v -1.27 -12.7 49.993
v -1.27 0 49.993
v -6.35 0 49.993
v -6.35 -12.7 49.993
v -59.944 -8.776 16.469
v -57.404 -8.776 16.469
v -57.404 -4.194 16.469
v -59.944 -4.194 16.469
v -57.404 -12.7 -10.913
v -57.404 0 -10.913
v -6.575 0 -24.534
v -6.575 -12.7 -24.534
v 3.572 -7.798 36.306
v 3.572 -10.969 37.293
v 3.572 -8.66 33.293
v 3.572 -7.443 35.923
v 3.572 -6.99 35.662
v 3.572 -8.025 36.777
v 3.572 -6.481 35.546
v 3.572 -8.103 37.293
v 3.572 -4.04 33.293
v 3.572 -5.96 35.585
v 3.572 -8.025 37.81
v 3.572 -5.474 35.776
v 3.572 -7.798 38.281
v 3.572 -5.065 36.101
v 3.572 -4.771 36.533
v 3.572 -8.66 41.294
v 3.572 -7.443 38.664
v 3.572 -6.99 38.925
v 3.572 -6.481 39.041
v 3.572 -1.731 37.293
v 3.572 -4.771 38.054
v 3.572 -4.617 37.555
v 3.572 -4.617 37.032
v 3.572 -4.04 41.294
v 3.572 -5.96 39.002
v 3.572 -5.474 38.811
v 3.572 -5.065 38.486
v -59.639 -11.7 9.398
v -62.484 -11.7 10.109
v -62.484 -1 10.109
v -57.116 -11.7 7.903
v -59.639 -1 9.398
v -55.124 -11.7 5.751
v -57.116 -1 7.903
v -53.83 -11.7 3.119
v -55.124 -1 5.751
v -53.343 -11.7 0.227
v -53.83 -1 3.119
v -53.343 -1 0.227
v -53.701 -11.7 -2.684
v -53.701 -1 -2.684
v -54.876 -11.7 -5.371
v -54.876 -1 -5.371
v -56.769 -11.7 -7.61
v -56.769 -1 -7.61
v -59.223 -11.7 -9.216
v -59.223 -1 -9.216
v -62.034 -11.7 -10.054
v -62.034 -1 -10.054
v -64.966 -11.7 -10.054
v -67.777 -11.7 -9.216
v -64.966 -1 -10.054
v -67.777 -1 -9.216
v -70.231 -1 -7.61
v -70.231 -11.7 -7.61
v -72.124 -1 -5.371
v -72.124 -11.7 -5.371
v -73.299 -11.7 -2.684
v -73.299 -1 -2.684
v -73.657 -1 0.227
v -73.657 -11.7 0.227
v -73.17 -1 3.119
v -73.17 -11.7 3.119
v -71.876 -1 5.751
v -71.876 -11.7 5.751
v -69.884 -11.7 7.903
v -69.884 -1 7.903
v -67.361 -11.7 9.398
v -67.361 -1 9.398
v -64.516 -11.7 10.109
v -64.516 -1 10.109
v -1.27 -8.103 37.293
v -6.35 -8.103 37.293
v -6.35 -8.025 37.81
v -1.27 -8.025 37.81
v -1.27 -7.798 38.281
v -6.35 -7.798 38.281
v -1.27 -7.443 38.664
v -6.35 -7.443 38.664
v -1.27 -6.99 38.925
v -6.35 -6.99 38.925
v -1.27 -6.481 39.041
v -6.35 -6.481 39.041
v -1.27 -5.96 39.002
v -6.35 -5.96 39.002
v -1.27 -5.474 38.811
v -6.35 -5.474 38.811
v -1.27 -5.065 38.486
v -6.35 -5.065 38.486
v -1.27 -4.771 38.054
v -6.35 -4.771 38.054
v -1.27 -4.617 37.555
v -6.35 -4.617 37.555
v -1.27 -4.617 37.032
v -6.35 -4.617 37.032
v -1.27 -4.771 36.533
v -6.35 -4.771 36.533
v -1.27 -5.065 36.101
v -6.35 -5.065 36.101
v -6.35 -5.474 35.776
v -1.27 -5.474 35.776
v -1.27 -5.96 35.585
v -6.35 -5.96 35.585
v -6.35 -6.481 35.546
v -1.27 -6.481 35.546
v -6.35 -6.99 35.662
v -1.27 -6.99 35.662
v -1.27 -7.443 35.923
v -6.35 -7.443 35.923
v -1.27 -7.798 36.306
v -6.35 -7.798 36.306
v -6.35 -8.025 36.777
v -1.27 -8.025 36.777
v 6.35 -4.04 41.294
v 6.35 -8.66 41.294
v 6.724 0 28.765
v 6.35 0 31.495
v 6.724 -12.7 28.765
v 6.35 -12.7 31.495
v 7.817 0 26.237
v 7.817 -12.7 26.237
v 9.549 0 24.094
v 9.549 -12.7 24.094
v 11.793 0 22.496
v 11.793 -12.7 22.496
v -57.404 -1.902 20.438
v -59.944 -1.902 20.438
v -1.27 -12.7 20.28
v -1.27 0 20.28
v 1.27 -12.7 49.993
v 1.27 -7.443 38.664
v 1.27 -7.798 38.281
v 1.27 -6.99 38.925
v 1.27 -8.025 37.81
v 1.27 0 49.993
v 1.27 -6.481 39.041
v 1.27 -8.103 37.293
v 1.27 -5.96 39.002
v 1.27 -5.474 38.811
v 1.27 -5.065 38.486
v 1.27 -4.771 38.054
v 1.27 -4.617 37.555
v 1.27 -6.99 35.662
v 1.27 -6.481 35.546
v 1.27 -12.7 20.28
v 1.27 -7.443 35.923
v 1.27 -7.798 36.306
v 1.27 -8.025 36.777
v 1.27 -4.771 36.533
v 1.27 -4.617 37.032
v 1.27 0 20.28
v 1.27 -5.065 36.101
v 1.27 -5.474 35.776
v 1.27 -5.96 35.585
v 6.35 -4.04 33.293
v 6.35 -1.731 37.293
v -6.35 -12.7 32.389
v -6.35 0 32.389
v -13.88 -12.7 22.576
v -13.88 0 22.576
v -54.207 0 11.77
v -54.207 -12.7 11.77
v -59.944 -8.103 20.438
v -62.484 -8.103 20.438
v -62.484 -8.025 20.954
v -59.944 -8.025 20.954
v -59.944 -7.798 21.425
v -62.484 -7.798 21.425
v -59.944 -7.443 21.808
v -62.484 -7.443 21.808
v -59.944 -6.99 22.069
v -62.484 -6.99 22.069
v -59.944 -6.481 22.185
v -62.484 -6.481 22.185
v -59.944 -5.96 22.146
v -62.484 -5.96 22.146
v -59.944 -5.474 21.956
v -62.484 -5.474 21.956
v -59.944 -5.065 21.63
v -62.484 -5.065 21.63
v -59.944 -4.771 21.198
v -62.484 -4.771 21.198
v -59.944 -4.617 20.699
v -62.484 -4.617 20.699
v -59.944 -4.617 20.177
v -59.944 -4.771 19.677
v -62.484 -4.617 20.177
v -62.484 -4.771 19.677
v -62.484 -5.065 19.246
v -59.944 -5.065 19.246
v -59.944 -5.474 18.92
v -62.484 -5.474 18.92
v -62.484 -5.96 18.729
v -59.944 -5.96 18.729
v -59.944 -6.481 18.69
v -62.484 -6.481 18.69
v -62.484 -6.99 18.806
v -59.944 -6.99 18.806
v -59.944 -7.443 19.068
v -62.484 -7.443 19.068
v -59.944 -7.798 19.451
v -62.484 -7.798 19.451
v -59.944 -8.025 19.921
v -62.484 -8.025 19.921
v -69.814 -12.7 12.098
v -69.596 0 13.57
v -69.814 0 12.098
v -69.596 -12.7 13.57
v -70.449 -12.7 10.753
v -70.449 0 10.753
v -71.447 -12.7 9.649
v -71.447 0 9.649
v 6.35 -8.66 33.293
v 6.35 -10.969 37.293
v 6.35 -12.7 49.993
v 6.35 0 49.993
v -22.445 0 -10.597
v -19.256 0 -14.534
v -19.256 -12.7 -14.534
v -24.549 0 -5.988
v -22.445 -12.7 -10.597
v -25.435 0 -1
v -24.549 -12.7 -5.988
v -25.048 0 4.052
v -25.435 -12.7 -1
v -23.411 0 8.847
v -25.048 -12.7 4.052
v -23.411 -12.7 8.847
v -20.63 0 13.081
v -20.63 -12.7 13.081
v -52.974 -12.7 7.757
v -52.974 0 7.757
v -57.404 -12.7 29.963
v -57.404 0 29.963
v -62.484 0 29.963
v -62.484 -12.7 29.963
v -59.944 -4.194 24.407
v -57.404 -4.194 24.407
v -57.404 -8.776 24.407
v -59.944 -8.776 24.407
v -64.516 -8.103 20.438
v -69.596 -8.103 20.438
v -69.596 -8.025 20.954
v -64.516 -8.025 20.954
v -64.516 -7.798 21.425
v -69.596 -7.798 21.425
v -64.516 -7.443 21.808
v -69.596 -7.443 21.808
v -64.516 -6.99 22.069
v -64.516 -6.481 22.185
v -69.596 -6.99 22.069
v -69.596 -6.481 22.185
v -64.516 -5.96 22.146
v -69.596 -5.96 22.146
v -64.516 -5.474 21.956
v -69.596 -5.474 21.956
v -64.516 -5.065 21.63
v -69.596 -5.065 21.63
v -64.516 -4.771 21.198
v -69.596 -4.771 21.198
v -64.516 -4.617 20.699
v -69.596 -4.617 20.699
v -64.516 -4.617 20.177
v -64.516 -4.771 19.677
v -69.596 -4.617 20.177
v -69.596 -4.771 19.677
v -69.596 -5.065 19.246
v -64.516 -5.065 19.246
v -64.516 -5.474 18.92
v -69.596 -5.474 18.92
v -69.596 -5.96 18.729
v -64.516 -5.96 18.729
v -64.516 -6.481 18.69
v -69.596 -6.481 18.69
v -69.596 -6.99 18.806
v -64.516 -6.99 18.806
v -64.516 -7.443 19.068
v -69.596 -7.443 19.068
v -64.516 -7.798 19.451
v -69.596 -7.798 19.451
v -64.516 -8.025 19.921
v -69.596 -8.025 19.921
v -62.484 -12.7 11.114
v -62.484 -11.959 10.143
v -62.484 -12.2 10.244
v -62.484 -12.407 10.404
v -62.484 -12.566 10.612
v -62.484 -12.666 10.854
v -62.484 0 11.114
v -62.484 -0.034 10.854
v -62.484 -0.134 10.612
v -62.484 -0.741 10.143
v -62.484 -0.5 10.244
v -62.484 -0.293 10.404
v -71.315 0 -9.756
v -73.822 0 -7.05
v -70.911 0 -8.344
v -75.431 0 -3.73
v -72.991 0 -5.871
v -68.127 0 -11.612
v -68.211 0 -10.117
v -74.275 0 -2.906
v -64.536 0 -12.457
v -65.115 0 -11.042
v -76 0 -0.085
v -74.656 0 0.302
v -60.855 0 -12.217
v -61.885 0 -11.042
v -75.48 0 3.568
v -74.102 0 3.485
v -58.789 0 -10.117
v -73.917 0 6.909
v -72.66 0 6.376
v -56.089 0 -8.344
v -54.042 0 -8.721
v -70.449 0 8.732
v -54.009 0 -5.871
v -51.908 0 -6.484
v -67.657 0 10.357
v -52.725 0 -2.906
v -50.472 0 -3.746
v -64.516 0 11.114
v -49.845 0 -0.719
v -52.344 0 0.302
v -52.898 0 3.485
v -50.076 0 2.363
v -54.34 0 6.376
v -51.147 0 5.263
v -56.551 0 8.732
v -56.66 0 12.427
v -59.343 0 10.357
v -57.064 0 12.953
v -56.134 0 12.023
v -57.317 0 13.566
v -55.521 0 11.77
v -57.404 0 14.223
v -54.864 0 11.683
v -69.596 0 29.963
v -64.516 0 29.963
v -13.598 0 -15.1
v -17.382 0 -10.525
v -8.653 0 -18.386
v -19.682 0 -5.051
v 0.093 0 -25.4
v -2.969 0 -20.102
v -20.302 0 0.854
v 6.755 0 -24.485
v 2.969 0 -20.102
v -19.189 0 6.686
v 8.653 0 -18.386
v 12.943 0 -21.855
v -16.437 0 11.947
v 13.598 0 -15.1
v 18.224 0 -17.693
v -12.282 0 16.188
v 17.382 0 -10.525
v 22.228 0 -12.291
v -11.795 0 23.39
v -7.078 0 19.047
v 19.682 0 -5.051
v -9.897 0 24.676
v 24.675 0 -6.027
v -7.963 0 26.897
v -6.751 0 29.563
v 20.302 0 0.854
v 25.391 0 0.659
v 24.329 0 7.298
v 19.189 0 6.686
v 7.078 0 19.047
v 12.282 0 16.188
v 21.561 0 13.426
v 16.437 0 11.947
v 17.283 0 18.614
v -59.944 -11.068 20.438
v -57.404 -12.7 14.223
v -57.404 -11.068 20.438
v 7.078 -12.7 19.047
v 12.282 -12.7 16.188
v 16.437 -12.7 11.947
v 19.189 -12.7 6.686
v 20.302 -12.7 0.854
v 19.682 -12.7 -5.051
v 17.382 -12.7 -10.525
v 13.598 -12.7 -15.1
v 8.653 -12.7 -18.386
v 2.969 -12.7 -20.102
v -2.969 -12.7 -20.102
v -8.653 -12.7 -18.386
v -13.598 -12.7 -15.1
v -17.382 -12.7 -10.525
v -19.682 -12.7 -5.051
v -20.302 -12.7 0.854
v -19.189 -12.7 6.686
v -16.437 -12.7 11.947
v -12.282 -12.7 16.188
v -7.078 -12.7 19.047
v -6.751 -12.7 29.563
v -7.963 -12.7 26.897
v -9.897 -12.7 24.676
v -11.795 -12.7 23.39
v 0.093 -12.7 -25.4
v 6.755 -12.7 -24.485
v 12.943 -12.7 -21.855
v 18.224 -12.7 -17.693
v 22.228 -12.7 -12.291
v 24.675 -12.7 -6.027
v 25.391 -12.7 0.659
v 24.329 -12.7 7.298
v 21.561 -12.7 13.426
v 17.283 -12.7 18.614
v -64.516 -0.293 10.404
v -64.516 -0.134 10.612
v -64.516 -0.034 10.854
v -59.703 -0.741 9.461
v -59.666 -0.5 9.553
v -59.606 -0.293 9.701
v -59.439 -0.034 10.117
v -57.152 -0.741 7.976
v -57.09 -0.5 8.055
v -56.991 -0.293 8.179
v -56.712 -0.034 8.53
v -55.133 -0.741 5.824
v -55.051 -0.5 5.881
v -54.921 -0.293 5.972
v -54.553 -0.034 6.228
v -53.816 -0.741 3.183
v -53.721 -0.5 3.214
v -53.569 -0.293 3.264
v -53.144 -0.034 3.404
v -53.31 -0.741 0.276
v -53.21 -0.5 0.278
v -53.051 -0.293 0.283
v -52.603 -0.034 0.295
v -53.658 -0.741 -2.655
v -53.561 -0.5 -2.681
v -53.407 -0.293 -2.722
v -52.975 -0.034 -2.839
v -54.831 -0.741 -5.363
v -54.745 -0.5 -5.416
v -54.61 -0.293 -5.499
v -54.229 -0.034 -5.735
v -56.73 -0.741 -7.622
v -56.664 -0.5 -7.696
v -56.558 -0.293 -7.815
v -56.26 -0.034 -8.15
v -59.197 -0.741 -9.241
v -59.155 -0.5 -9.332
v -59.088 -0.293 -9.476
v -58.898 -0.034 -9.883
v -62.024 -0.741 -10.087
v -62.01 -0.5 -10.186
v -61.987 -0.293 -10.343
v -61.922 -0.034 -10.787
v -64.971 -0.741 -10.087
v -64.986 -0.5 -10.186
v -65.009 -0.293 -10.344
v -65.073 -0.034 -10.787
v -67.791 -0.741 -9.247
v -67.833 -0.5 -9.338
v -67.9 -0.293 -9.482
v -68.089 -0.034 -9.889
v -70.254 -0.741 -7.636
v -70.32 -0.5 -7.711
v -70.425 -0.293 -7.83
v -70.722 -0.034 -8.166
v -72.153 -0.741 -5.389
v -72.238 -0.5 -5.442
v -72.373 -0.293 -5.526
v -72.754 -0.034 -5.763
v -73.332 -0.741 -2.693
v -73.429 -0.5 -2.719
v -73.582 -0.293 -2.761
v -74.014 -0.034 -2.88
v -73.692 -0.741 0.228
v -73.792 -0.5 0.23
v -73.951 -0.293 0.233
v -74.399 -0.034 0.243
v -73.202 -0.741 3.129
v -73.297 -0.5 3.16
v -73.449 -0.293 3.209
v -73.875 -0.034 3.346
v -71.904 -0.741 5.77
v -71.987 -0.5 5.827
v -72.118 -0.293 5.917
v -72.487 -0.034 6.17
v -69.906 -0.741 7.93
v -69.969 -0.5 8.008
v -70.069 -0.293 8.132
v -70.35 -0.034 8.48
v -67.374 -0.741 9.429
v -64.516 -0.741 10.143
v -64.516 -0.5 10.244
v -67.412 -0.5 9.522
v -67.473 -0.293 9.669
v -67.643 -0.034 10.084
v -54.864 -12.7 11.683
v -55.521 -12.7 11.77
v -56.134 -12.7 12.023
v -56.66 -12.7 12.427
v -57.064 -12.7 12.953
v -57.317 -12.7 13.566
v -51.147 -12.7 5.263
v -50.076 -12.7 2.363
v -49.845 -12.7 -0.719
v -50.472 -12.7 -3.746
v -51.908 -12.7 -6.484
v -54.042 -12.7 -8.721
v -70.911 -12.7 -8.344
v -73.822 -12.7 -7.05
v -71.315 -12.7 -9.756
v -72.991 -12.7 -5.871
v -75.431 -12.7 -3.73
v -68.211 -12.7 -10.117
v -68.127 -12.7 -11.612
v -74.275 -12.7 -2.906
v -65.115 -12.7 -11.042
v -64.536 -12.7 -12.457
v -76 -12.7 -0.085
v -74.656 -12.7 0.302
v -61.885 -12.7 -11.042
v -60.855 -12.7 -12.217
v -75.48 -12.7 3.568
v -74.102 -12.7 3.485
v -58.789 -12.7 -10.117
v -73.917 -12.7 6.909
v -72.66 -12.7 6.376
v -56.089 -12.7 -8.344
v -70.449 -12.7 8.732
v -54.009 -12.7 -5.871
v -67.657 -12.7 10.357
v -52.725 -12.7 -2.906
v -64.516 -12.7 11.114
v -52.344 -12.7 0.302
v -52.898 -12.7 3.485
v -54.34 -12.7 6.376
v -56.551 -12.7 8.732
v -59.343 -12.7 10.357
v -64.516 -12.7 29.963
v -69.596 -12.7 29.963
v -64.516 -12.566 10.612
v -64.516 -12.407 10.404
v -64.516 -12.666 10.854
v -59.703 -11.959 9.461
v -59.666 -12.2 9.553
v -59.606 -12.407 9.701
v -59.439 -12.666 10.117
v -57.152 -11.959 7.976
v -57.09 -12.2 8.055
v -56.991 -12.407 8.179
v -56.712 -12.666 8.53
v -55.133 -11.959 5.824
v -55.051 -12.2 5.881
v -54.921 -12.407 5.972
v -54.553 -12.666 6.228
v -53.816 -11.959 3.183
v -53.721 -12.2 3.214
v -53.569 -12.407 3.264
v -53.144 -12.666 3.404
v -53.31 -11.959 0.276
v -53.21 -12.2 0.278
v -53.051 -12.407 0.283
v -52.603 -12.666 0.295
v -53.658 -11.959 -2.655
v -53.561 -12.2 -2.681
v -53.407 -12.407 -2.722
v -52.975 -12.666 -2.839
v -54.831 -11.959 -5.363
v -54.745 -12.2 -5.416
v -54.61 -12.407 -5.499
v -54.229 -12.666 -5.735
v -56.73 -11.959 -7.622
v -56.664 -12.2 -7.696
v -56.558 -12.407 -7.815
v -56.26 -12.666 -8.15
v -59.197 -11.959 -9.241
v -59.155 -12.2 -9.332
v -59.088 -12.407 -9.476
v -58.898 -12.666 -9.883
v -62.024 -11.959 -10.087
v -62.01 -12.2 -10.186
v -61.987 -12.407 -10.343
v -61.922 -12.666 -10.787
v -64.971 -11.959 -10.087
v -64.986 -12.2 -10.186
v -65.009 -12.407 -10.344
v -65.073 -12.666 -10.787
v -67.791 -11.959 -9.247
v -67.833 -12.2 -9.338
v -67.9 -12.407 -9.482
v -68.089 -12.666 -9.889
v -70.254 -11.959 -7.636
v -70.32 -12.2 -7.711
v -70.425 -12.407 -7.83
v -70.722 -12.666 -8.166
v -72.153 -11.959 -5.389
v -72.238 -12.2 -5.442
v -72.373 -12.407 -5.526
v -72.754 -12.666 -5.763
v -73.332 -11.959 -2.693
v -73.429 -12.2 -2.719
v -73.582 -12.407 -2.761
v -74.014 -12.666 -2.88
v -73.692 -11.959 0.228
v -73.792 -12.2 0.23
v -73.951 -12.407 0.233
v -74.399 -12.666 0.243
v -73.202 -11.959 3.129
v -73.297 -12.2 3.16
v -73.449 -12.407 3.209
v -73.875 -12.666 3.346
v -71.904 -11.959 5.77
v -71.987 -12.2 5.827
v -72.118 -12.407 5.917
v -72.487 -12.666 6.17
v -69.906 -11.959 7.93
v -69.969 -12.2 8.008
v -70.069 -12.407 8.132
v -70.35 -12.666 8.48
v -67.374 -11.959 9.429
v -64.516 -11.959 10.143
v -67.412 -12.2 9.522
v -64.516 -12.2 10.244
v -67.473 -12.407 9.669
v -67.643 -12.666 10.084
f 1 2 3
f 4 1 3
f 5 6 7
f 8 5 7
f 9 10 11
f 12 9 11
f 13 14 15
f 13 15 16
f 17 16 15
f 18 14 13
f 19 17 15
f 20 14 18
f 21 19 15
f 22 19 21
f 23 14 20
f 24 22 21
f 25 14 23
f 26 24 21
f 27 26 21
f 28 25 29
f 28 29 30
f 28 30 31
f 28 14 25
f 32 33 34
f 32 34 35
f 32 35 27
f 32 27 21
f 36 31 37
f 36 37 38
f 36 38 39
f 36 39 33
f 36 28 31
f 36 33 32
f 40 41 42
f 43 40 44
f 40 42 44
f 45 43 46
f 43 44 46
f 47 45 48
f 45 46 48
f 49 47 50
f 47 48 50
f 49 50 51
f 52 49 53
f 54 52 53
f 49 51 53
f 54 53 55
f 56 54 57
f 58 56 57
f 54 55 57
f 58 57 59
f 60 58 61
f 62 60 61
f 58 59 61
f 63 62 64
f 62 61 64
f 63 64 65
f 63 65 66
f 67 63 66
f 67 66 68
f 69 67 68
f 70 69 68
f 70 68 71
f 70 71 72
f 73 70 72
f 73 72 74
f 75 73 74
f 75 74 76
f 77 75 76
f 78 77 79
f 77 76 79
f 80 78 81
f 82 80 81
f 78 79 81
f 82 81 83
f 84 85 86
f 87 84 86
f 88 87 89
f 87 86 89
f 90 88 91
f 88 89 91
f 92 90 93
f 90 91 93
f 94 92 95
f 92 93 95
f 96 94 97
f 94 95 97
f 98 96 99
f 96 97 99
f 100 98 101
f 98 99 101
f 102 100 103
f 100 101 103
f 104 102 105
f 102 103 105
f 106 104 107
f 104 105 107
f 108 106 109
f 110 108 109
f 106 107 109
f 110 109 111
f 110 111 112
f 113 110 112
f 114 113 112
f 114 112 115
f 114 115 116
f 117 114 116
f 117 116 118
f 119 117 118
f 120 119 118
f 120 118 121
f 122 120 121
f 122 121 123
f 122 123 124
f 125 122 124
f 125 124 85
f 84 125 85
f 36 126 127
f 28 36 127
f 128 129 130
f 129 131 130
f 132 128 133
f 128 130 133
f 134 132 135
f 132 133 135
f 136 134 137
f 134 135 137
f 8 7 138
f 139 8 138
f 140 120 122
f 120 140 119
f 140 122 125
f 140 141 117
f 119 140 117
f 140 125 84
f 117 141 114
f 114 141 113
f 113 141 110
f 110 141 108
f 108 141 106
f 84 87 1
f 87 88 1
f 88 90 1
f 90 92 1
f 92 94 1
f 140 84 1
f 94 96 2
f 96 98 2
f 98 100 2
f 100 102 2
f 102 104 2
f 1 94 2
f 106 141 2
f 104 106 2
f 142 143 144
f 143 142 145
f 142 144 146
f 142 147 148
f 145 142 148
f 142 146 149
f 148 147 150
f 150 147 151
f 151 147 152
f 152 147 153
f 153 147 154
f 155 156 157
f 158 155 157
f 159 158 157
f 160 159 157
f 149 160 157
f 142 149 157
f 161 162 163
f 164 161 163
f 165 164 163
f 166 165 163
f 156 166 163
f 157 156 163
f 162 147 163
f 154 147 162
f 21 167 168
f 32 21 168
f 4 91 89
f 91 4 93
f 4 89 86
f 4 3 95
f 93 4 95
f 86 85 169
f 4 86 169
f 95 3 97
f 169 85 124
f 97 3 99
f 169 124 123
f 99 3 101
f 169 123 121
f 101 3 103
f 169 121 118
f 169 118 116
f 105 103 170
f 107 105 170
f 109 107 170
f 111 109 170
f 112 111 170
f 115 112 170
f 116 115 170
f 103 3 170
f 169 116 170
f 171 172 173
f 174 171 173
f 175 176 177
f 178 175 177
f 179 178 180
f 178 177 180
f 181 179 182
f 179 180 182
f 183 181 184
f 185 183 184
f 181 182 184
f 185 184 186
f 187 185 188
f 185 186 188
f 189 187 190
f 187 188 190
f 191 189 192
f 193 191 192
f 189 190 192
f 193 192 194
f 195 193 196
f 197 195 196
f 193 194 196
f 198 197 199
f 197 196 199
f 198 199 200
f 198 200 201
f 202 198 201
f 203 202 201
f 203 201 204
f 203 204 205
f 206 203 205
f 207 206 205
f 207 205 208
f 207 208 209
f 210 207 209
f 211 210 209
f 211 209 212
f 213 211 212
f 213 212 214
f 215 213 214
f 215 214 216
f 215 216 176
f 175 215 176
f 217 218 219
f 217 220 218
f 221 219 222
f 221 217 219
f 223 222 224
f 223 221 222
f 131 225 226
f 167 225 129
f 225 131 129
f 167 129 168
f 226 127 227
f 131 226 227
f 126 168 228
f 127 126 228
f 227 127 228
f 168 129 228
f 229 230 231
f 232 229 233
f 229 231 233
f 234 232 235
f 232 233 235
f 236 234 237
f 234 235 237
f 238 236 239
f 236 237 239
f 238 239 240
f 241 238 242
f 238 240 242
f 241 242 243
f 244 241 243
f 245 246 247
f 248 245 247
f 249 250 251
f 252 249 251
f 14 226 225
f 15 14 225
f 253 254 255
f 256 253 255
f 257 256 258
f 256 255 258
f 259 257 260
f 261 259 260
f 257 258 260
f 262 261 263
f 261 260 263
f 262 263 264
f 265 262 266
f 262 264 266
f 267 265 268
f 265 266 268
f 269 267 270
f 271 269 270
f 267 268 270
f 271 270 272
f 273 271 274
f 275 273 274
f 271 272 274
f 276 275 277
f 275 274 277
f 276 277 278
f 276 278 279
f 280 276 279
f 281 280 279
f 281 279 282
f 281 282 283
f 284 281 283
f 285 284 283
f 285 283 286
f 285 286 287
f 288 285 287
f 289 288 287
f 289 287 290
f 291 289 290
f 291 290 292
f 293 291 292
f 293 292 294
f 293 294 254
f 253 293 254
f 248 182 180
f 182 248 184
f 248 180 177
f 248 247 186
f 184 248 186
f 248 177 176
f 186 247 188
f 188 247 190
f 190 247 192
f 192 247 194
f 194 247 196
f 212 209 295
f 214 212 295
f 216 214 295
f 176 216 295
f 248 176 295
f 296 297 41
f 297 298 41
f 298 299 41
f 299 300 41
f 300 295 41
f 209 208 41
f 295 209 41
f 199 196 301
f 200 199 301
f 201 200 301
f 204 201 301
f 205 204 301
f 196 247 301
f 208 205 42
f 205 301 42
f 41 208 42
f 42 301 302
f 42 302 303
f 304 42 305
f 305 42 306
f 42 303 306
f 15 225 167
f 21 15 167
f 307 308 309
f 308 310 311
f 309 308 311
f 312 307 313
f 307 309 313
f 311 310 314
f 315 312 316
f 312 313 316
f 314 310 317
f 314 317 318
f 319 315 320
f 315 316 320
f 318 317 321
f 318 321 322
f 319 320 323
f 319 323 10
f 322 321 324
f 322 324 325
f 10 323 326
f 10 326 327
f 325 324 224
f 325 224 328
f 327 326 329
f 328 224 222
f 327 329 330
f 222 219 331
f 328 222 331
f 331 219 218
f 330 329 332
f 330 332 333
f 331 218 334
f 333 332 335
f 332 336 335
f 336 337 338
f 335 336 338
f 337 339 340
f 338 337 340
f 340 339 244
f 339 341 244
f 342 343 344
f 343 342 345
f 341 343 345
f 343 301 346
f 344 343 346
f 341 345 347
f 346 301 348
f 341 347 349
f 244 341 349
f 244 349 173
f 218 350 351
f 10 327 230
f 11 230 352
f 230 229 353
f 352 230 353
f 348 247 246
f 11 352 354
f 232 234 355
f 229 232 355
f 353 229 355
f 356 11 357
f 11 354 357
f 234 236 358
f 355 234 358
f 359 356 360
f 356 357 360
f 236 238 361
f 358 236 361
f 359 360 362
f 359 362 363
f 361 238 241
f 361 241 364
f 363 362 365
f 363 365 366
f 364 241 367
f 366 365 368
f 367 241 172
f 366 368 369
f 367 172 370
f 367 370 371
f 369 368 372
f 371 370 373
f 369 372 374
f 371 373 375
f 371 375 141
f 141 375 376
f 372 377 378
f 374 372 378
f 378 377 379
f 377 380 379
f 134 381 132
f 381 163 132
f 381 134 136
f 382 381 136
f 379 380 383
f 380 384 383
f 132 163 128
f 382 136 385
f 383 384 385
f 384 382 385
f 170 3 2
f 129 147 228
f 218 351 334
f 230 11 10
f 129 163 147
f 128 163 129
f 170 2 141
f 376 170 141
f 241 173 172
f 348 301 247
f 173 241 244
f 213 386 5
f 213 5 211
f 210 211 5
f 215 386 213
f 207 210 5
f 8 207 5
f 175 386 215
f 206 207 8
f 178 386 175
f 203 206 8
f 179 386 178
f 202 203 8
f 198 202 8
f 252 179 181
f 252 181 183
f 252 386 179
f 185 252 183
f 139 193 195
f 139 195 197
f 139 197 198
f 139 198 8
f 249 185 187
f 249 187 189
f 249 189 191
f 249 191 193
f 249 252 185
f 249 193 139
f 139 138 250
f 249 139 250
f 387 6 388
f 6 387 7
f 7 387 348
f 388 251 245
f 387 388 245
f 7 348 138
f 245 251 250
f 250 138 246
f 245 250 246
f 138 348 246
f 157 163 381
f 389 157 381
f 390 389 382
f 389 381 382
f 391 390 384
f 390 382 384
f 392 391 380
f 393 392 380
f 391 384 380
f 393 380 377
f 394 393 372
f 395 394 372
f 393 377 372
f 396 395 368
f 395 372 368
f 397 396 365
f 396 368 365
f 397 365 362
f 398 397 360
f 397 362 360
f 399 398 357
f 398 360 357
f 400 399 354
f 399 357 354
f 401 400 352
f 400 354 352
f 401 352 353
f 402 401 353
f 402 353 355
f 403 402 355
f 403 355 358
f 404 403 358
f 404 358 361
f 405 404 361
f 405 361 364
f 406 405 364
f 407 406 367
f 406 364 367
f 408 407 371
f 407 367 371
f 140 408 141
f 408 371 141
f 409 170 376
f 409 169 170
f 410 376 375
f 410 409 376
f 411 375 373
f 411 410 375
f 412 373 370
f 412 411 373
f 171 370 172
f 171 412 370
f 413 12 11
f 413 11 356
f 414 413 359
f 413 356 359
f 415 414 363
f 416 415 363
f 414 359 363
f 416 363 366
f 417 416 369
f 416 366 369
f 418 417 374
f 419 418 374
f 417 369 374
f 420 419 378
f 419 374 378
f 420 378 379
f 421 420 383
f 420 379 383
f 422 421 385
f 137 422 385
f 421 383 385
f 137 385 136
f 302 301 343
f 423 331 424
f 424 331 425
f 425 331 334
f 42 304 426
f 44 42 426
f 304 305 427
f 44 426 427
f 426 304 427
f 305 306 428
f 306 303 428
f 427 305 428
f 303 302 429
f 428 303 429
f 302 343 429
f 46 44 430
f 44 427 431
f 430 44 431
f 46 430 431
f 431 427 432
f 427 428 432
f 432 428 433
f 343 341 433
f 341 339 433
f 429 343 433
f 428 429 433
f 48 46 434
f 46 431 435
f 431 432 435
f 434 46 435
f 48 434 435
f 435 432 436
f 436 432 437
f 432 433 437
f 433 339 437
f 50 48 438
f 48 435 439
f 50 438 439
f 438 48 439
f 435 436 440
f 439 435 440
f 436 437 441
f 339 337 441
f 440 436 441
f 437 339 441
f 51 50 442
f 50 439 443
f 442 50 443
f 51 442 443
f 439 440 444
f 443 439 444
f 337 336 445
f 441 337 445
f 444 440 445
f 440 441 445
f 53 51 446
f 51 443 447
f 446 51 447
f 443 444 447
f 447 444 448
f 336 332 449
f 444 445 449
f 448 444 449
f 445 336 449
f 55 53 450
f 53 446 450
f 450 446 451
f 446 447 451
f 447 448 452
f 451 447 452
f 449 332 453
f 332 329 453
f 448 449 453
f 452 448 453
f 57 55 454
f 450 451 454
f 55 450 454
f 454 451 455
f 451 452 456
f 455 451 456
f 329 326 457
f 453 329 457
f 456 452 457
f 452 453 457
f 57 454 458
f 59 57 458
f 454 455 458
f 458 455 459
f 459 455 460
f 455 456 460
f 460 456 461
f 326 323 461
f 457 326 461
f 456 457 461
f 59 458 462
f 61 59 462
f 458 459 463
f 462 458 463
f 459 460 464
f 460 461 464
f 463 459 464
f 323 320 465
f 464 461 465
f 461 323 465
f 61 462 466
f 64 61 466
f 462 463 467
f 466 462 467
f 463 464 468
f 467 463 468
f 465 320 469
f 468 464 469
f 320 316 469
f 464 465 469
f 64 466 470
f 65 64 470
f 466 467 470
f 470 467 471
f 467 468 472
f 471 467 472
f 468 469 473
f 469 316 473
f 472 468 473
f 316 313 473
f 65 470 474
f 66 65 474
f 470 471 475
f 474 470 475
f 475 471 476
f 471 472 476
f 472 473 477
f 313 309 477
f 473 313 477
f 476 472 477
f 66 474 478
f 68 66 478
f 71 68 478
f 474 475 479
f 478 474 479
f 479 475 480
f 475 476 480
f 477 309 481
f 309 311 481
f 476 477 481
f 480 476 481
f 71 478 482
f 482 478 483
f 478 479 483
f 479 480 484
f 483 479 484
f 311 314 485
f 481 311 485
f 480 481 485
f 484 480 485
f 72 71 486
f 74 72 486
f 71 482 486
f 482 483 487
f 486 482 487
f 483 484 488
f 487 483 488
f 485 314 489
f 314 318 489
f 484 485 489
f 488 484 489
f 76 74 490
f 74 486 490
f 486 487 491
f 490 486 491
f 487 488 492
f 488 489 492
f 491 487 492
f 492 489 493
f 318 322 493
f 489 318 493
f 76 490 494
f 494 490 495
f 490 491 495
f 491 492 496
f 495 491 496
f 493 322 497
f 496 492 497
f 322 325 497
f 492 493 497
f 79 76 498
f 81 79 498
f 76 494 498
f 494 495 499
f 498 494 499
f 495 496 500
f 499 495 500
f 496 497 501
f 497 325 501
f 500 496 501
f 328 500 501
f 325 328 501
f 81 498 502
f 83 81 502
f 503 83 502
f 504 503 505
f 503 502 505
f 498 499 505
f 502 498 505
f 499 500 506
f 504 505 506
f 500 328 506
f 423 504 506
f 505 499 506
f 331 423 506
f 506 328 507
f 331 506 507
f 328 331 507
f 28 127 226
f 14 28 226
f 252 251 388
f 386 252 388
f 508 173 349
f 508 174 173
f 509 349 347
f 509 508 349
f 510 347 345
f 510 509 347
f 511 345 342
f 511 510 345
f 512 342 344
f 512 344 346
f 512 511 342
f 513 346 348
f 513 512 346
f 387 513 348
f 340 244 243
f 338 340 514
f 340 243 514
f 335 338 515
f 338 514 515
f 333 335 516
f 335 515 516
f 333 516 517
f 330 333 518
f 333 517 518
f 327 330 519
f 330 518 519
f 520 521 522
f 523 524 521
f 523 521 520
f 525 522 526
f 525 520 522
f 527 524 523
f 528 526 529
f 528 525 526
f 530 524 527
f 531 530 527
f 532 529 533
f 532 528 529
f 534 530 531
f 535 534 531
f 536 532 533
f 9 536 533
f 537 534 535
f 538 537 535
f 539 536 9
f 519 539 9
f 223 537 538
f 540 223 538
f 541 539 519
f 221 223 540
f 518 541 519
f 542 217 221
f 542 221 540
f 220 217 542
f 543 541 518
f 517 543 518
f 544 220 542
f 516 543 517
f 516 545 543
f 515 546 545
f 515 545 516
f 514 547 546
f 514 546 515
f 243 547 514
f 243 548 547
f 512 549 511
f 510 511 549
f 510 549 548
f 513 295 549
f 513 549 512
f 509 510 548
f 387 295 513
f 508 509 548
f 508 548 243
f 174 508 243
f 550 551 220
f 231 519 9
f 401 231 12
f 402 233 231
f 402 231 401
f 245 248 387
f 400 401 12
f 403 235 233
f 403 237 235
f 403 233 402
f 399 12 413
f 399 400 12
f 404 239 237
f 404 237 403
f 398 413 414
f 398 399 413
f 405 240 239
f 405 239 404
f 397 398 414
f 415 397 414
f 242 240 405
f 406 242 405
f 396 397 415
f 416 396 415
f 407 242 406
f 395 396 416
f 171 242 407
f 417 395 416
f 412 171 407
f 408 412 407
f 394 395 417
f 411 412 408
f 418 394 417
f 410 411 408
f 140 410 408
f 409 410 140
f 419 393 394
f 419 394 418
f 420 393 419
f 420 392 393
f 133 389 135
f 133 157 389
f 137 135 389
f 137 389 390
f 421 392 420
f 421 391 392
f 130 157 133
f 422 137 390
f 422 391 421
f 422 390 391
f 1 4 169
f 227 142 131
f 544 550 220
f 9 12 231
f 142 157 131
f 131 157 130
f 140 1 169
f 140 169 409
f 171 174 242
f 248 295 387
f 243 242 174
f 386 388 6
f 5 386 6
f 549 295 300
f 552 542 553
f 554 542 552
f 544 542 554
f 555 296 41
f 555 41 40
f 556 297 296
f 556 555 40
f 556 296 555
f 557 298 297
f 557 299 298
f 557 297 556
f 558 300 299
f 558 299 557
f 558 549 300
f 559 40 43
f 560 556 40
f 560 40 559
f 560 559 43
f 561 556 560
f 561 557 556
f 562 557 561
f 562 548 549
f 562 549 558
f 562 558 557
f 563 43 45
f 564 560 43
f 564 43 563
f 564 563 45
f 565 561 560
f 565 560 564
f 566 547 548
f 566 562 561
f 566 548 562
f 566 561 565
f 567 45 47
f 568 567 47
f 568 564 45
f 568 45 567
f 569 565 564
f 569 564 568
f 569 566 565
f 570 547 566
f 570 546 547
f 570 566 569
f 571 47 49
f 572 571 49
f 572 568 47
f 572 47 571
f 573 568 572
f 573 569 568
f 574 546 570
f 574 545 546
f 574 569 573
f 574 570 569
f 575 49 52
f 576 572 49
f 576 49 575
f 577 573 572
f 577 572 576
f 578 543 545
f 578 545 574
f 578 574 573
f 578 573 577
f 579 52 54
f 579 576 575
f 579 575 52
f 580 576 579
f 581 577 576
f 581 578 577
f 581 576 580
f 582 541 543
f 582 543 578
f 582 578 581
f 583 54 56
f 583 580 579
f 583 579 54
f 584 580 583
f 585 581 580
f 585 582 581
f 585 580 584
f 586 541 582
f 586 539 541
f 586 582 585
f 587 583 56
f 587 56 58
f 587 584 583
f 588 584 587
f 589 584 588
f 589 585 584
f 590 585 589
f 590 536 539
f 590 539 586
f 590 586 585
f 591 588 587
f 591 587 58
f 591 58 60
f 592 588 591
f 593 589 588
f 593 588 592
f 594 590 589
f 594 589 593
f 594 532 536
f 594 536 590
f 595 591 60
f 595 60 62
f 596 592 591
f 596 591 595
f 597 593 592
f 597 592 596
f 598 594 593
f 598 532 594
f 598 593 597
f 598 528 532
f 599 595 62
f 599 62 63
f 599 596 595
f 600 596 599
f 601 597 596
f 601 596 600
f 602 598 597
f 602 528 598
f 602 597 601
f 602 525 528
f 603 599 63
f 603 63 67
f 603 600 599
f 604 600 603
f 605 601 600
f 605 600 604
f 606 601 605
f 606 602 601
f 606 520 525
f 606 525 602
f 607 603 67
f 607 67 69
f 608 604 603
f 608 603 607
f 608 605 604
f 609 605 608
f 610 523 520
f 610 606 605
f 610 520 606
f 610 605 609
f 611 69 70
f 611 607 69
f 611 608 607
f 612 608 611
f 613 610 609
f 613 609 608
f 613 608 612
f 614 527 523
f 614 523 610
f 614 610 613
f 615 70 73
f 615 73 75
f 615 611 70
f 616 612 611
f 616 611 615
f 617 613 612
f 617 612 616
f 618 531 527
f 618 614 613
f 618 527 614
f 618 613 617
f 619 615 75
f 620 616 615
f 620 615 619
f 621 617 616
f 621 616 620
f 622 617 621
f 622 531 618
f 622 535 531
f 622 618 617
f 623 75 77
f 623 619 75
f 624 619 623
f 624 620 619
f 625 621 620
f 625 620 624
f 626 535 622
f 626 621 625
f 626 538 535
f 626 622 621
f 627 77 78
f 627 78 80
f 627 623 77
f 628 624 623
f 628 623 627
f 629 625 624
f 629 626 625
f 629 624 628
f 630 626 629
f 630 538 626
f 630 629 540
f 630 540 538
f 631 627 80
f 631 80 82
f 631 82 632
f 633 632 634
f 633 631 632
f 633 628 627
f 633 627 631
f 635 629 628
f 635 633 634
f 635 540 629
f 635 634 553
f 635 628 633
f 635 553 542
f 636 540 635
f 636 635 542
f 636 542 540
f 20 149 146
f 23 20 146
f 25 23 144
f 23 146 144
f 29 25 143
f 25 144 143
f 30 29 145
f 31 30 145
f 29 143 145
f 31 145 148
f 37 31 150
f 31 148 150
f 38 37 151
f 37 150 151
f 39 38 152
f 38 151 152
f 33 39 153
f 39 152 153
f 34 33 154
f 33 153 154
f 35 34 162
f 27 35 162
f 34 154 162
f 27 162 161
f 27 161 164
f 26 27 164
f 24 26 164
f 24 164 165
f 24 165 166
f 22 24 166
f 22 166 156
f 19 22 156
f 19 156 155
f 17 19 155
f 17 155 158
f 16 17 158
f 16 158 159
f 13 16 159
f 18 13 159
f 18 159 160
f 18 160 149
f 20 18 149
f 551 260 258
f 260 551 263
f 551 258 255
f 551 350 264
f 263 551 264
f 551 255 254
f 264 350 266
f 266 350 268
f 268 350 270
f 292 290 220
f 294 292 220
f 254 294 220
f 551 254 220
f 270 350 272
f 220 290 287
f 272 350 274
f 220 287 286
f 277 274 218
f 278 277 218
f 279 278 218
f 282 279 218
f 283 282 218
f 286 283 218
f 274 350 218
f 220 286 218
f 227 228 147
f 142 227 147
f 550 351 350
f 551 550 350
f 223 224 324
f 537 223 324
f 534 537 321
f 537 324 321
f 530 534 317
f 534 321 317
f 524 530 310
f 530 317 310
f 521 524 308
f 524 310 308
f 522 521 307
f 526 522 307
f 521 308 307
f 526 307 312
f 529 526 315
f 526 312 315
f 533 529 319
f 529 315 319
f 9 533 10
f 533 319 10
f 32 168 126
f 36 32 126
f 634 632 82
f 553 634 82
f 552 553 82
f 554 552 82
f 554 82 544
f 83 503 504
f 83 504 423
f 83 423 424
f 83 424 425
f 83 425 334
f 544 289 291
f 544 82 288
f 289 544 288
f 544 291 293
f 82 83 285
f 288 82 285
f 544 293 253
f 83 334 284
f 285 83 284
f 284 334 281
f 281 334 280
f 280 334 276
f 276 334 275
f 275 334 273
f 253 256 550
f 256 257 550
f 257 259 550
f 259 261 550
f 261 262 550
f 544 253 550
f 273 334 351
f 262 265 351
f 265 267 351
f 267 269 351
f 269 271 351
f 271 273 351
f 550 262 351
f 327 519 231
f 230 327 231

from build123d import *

# Parameters (mm, degrees)
F1_DEPTH  = 12.7
F3_DEPTH  = 2.778125
F5_D      = 3.5052
F5_DEPTH  = 19.05
F7_DEPTH  = 2.54
F8_R      = 10.16
F9_R      = 10.16
F10_R     = 2.54
F11_R     = 5.08
F13_R     = 1
F14_R     = 1
F16_D     = 3.5052
F16_DEPTH = 12.7
F17_DEPTH = 25


with BuildPart() as f1:
    # F0 (on Front) → F1 (new body)
    with BuildSketch(Plane.XZ):
        with BuildLine():
            Line((-6.35, 49.993444), (-6.35, 24.593444))
            Line((-6.35, 24.593444), (-6.798163, 24.473352))
            Line((-6.798163, 24.473352), (-57.404, 10.912781))
            Line((-57.404, 10.912781), (-57.404, 29.962781))
            Line((-57.404, 29.962781), (-62.484, 29.962781))
            Line((-62.484, 29.962781), (-62.484, 12.458641))
            Line((-62.484, 12.458641), (-62.484, 10.109072))
            ThreePointArc((-62.484, 10.109072), (-63.5, -10.16), (-64.516, 10.109072))
            Line((-64.516, 10.109072), (-64.516, 12.458641))
            Line((-64.516, 12.458641), (-64.516, 29.962781))
            Line((-64.516, 29.962781), (-69.596, 29.962781))
            Line((-69.596, 29.962781), (-69.596, 10.912781))
            ThreePointArc((-69.596, 10.912781), (-74.412781, -6.096), (-57.404, -10.912781))
            Line((-57.404, -10.912781), (-6.57485, -24.534289))
            ThreePointArc((-6.57485, -24.534289), (24.564124, -6.462493), (6.35, 24.593444))
            Line((6.35, 24.593444), (6.35, 49.993444))
            Line((6.35, 49.993444), (1.27, 49.993444))
            Line((1.27, 49.993444), (1.27, 25.36823))
            Line((1.27, 25.36823), (1.27, 20.280274))
            ThreePointArc((1.27, 20.280274), (0, -20.32), (-1.27, 20.280274))
            Line((-1.27, 20.280274), (-1.27, 25.36823))
            Line((-1.27, 25.36823), (-1.27, 49.993444))
            Line((-1.27, 49.993444), (-6.35, 49.993444))
        make_face()
    extrude(amount=F1_DEPTH)

    # F2 (on face) → F3 (cut)
    with BuildSketch(Plane.YZ.offset(6.35)):
        Polygon((-8.65969, 33.292944), (-4.04031, 33.292944), (-1.73062, 37.293444), (-4.04031, 41.293944), (-8.65969, 41.293944), (-10.96938, 37.293444), align=None)
    extrude(amount=-F3_DEPTH, mode=Mode.SUBTRACT)

    # F5
    with Locations(Plane.YZ.offset(3.571875)):
        with Locations((-6.35, 37.293444)):
            Hole(F5_D / 2, depth=F5_DEPTH)

    # F6 (on face) → F7 (cut)
    with BuildSketch(Plane.YZ.offset(-57.404)):
        Polygon((-11.067651, 20.437781), (-8.776292, 16.469031), (-4.193574, 16.469031), (-1.902215, 20.437781), (-4.193574, 24.406531), (-8.776292, 24.406531), align=None)
    extrude(amount=-F7_DEPTH, mode=Mode.SUBTRACT)

    # F8
    f8_edges = [f1.edges().sort_by_distance(p)[0] for p in [
        (-6.35, -6.35, 24.593444),
    ]]
    fillet(f8_edges, radius=F8_R)

    # F9
    f9_edges = [f1.edges().sort_by_distance(p)[0] for p in [
        (6.35, -6.35, 24.593444),
    ]]
    fillet(f9_edges, radius=F9_R)

    # F10
    f10_edges = [f1.edges().sort_by_distance(p)[0] for p in [
        (-57.404, -6.35, 10.912781),
    ]]
    fillet(f10_edges, radius=F10_R)

    # F11
    f11_edges = [f1.edges().sort_by_distance(p)[0] for p in [
        (-69.596, -6.35, 10.912781),
    ]]
    fillet(f11_edges, radius=F11_R)

    # F13
    f13_edges = [f1.edges().sort_by_distance(p)[0] for p in [
        (-63.5, -12.7, -10.16),
    ]]
    fillet(f13_edges, radius=F13_R)

    # F14
    f14_edges = [f1.edges().sort_by_distance(p)[0] for p in [
        (-63.5, 0, -10.16),
    ]]
    fillet(f14_edges, radius=F14_R)

    # F16
    with Locations(Plane.YZ.offset(-59.944)):
        with Locations((-6.35, 20.437781)):
            Hole(F16_D / 2, depth=F16_DEPTH)

    # F12 (on face) → F17 (cut)
    with BuildSketch(Plane.XZ.offset(12.7)):
        with BuildLine():
            ThreePointArc((-52.974038, 7.756792), (-49.845473, -0.719281), (-54.042015, -8.720579))
            Line((-54.042015, -8.720579), (-19.25646, -14.533902))
            ThreePointArc((-19.25646, -14.533902), (-25.435108, -0.999564), (-20.629572, 13.080949))
            Line((-20.629572, 13.080949), (-52.974038, 7.756792))
        make_face()
    extrude(amount=-F17_DEPTH, mode=Mode.SUBTRACT)


solid = f1.part
